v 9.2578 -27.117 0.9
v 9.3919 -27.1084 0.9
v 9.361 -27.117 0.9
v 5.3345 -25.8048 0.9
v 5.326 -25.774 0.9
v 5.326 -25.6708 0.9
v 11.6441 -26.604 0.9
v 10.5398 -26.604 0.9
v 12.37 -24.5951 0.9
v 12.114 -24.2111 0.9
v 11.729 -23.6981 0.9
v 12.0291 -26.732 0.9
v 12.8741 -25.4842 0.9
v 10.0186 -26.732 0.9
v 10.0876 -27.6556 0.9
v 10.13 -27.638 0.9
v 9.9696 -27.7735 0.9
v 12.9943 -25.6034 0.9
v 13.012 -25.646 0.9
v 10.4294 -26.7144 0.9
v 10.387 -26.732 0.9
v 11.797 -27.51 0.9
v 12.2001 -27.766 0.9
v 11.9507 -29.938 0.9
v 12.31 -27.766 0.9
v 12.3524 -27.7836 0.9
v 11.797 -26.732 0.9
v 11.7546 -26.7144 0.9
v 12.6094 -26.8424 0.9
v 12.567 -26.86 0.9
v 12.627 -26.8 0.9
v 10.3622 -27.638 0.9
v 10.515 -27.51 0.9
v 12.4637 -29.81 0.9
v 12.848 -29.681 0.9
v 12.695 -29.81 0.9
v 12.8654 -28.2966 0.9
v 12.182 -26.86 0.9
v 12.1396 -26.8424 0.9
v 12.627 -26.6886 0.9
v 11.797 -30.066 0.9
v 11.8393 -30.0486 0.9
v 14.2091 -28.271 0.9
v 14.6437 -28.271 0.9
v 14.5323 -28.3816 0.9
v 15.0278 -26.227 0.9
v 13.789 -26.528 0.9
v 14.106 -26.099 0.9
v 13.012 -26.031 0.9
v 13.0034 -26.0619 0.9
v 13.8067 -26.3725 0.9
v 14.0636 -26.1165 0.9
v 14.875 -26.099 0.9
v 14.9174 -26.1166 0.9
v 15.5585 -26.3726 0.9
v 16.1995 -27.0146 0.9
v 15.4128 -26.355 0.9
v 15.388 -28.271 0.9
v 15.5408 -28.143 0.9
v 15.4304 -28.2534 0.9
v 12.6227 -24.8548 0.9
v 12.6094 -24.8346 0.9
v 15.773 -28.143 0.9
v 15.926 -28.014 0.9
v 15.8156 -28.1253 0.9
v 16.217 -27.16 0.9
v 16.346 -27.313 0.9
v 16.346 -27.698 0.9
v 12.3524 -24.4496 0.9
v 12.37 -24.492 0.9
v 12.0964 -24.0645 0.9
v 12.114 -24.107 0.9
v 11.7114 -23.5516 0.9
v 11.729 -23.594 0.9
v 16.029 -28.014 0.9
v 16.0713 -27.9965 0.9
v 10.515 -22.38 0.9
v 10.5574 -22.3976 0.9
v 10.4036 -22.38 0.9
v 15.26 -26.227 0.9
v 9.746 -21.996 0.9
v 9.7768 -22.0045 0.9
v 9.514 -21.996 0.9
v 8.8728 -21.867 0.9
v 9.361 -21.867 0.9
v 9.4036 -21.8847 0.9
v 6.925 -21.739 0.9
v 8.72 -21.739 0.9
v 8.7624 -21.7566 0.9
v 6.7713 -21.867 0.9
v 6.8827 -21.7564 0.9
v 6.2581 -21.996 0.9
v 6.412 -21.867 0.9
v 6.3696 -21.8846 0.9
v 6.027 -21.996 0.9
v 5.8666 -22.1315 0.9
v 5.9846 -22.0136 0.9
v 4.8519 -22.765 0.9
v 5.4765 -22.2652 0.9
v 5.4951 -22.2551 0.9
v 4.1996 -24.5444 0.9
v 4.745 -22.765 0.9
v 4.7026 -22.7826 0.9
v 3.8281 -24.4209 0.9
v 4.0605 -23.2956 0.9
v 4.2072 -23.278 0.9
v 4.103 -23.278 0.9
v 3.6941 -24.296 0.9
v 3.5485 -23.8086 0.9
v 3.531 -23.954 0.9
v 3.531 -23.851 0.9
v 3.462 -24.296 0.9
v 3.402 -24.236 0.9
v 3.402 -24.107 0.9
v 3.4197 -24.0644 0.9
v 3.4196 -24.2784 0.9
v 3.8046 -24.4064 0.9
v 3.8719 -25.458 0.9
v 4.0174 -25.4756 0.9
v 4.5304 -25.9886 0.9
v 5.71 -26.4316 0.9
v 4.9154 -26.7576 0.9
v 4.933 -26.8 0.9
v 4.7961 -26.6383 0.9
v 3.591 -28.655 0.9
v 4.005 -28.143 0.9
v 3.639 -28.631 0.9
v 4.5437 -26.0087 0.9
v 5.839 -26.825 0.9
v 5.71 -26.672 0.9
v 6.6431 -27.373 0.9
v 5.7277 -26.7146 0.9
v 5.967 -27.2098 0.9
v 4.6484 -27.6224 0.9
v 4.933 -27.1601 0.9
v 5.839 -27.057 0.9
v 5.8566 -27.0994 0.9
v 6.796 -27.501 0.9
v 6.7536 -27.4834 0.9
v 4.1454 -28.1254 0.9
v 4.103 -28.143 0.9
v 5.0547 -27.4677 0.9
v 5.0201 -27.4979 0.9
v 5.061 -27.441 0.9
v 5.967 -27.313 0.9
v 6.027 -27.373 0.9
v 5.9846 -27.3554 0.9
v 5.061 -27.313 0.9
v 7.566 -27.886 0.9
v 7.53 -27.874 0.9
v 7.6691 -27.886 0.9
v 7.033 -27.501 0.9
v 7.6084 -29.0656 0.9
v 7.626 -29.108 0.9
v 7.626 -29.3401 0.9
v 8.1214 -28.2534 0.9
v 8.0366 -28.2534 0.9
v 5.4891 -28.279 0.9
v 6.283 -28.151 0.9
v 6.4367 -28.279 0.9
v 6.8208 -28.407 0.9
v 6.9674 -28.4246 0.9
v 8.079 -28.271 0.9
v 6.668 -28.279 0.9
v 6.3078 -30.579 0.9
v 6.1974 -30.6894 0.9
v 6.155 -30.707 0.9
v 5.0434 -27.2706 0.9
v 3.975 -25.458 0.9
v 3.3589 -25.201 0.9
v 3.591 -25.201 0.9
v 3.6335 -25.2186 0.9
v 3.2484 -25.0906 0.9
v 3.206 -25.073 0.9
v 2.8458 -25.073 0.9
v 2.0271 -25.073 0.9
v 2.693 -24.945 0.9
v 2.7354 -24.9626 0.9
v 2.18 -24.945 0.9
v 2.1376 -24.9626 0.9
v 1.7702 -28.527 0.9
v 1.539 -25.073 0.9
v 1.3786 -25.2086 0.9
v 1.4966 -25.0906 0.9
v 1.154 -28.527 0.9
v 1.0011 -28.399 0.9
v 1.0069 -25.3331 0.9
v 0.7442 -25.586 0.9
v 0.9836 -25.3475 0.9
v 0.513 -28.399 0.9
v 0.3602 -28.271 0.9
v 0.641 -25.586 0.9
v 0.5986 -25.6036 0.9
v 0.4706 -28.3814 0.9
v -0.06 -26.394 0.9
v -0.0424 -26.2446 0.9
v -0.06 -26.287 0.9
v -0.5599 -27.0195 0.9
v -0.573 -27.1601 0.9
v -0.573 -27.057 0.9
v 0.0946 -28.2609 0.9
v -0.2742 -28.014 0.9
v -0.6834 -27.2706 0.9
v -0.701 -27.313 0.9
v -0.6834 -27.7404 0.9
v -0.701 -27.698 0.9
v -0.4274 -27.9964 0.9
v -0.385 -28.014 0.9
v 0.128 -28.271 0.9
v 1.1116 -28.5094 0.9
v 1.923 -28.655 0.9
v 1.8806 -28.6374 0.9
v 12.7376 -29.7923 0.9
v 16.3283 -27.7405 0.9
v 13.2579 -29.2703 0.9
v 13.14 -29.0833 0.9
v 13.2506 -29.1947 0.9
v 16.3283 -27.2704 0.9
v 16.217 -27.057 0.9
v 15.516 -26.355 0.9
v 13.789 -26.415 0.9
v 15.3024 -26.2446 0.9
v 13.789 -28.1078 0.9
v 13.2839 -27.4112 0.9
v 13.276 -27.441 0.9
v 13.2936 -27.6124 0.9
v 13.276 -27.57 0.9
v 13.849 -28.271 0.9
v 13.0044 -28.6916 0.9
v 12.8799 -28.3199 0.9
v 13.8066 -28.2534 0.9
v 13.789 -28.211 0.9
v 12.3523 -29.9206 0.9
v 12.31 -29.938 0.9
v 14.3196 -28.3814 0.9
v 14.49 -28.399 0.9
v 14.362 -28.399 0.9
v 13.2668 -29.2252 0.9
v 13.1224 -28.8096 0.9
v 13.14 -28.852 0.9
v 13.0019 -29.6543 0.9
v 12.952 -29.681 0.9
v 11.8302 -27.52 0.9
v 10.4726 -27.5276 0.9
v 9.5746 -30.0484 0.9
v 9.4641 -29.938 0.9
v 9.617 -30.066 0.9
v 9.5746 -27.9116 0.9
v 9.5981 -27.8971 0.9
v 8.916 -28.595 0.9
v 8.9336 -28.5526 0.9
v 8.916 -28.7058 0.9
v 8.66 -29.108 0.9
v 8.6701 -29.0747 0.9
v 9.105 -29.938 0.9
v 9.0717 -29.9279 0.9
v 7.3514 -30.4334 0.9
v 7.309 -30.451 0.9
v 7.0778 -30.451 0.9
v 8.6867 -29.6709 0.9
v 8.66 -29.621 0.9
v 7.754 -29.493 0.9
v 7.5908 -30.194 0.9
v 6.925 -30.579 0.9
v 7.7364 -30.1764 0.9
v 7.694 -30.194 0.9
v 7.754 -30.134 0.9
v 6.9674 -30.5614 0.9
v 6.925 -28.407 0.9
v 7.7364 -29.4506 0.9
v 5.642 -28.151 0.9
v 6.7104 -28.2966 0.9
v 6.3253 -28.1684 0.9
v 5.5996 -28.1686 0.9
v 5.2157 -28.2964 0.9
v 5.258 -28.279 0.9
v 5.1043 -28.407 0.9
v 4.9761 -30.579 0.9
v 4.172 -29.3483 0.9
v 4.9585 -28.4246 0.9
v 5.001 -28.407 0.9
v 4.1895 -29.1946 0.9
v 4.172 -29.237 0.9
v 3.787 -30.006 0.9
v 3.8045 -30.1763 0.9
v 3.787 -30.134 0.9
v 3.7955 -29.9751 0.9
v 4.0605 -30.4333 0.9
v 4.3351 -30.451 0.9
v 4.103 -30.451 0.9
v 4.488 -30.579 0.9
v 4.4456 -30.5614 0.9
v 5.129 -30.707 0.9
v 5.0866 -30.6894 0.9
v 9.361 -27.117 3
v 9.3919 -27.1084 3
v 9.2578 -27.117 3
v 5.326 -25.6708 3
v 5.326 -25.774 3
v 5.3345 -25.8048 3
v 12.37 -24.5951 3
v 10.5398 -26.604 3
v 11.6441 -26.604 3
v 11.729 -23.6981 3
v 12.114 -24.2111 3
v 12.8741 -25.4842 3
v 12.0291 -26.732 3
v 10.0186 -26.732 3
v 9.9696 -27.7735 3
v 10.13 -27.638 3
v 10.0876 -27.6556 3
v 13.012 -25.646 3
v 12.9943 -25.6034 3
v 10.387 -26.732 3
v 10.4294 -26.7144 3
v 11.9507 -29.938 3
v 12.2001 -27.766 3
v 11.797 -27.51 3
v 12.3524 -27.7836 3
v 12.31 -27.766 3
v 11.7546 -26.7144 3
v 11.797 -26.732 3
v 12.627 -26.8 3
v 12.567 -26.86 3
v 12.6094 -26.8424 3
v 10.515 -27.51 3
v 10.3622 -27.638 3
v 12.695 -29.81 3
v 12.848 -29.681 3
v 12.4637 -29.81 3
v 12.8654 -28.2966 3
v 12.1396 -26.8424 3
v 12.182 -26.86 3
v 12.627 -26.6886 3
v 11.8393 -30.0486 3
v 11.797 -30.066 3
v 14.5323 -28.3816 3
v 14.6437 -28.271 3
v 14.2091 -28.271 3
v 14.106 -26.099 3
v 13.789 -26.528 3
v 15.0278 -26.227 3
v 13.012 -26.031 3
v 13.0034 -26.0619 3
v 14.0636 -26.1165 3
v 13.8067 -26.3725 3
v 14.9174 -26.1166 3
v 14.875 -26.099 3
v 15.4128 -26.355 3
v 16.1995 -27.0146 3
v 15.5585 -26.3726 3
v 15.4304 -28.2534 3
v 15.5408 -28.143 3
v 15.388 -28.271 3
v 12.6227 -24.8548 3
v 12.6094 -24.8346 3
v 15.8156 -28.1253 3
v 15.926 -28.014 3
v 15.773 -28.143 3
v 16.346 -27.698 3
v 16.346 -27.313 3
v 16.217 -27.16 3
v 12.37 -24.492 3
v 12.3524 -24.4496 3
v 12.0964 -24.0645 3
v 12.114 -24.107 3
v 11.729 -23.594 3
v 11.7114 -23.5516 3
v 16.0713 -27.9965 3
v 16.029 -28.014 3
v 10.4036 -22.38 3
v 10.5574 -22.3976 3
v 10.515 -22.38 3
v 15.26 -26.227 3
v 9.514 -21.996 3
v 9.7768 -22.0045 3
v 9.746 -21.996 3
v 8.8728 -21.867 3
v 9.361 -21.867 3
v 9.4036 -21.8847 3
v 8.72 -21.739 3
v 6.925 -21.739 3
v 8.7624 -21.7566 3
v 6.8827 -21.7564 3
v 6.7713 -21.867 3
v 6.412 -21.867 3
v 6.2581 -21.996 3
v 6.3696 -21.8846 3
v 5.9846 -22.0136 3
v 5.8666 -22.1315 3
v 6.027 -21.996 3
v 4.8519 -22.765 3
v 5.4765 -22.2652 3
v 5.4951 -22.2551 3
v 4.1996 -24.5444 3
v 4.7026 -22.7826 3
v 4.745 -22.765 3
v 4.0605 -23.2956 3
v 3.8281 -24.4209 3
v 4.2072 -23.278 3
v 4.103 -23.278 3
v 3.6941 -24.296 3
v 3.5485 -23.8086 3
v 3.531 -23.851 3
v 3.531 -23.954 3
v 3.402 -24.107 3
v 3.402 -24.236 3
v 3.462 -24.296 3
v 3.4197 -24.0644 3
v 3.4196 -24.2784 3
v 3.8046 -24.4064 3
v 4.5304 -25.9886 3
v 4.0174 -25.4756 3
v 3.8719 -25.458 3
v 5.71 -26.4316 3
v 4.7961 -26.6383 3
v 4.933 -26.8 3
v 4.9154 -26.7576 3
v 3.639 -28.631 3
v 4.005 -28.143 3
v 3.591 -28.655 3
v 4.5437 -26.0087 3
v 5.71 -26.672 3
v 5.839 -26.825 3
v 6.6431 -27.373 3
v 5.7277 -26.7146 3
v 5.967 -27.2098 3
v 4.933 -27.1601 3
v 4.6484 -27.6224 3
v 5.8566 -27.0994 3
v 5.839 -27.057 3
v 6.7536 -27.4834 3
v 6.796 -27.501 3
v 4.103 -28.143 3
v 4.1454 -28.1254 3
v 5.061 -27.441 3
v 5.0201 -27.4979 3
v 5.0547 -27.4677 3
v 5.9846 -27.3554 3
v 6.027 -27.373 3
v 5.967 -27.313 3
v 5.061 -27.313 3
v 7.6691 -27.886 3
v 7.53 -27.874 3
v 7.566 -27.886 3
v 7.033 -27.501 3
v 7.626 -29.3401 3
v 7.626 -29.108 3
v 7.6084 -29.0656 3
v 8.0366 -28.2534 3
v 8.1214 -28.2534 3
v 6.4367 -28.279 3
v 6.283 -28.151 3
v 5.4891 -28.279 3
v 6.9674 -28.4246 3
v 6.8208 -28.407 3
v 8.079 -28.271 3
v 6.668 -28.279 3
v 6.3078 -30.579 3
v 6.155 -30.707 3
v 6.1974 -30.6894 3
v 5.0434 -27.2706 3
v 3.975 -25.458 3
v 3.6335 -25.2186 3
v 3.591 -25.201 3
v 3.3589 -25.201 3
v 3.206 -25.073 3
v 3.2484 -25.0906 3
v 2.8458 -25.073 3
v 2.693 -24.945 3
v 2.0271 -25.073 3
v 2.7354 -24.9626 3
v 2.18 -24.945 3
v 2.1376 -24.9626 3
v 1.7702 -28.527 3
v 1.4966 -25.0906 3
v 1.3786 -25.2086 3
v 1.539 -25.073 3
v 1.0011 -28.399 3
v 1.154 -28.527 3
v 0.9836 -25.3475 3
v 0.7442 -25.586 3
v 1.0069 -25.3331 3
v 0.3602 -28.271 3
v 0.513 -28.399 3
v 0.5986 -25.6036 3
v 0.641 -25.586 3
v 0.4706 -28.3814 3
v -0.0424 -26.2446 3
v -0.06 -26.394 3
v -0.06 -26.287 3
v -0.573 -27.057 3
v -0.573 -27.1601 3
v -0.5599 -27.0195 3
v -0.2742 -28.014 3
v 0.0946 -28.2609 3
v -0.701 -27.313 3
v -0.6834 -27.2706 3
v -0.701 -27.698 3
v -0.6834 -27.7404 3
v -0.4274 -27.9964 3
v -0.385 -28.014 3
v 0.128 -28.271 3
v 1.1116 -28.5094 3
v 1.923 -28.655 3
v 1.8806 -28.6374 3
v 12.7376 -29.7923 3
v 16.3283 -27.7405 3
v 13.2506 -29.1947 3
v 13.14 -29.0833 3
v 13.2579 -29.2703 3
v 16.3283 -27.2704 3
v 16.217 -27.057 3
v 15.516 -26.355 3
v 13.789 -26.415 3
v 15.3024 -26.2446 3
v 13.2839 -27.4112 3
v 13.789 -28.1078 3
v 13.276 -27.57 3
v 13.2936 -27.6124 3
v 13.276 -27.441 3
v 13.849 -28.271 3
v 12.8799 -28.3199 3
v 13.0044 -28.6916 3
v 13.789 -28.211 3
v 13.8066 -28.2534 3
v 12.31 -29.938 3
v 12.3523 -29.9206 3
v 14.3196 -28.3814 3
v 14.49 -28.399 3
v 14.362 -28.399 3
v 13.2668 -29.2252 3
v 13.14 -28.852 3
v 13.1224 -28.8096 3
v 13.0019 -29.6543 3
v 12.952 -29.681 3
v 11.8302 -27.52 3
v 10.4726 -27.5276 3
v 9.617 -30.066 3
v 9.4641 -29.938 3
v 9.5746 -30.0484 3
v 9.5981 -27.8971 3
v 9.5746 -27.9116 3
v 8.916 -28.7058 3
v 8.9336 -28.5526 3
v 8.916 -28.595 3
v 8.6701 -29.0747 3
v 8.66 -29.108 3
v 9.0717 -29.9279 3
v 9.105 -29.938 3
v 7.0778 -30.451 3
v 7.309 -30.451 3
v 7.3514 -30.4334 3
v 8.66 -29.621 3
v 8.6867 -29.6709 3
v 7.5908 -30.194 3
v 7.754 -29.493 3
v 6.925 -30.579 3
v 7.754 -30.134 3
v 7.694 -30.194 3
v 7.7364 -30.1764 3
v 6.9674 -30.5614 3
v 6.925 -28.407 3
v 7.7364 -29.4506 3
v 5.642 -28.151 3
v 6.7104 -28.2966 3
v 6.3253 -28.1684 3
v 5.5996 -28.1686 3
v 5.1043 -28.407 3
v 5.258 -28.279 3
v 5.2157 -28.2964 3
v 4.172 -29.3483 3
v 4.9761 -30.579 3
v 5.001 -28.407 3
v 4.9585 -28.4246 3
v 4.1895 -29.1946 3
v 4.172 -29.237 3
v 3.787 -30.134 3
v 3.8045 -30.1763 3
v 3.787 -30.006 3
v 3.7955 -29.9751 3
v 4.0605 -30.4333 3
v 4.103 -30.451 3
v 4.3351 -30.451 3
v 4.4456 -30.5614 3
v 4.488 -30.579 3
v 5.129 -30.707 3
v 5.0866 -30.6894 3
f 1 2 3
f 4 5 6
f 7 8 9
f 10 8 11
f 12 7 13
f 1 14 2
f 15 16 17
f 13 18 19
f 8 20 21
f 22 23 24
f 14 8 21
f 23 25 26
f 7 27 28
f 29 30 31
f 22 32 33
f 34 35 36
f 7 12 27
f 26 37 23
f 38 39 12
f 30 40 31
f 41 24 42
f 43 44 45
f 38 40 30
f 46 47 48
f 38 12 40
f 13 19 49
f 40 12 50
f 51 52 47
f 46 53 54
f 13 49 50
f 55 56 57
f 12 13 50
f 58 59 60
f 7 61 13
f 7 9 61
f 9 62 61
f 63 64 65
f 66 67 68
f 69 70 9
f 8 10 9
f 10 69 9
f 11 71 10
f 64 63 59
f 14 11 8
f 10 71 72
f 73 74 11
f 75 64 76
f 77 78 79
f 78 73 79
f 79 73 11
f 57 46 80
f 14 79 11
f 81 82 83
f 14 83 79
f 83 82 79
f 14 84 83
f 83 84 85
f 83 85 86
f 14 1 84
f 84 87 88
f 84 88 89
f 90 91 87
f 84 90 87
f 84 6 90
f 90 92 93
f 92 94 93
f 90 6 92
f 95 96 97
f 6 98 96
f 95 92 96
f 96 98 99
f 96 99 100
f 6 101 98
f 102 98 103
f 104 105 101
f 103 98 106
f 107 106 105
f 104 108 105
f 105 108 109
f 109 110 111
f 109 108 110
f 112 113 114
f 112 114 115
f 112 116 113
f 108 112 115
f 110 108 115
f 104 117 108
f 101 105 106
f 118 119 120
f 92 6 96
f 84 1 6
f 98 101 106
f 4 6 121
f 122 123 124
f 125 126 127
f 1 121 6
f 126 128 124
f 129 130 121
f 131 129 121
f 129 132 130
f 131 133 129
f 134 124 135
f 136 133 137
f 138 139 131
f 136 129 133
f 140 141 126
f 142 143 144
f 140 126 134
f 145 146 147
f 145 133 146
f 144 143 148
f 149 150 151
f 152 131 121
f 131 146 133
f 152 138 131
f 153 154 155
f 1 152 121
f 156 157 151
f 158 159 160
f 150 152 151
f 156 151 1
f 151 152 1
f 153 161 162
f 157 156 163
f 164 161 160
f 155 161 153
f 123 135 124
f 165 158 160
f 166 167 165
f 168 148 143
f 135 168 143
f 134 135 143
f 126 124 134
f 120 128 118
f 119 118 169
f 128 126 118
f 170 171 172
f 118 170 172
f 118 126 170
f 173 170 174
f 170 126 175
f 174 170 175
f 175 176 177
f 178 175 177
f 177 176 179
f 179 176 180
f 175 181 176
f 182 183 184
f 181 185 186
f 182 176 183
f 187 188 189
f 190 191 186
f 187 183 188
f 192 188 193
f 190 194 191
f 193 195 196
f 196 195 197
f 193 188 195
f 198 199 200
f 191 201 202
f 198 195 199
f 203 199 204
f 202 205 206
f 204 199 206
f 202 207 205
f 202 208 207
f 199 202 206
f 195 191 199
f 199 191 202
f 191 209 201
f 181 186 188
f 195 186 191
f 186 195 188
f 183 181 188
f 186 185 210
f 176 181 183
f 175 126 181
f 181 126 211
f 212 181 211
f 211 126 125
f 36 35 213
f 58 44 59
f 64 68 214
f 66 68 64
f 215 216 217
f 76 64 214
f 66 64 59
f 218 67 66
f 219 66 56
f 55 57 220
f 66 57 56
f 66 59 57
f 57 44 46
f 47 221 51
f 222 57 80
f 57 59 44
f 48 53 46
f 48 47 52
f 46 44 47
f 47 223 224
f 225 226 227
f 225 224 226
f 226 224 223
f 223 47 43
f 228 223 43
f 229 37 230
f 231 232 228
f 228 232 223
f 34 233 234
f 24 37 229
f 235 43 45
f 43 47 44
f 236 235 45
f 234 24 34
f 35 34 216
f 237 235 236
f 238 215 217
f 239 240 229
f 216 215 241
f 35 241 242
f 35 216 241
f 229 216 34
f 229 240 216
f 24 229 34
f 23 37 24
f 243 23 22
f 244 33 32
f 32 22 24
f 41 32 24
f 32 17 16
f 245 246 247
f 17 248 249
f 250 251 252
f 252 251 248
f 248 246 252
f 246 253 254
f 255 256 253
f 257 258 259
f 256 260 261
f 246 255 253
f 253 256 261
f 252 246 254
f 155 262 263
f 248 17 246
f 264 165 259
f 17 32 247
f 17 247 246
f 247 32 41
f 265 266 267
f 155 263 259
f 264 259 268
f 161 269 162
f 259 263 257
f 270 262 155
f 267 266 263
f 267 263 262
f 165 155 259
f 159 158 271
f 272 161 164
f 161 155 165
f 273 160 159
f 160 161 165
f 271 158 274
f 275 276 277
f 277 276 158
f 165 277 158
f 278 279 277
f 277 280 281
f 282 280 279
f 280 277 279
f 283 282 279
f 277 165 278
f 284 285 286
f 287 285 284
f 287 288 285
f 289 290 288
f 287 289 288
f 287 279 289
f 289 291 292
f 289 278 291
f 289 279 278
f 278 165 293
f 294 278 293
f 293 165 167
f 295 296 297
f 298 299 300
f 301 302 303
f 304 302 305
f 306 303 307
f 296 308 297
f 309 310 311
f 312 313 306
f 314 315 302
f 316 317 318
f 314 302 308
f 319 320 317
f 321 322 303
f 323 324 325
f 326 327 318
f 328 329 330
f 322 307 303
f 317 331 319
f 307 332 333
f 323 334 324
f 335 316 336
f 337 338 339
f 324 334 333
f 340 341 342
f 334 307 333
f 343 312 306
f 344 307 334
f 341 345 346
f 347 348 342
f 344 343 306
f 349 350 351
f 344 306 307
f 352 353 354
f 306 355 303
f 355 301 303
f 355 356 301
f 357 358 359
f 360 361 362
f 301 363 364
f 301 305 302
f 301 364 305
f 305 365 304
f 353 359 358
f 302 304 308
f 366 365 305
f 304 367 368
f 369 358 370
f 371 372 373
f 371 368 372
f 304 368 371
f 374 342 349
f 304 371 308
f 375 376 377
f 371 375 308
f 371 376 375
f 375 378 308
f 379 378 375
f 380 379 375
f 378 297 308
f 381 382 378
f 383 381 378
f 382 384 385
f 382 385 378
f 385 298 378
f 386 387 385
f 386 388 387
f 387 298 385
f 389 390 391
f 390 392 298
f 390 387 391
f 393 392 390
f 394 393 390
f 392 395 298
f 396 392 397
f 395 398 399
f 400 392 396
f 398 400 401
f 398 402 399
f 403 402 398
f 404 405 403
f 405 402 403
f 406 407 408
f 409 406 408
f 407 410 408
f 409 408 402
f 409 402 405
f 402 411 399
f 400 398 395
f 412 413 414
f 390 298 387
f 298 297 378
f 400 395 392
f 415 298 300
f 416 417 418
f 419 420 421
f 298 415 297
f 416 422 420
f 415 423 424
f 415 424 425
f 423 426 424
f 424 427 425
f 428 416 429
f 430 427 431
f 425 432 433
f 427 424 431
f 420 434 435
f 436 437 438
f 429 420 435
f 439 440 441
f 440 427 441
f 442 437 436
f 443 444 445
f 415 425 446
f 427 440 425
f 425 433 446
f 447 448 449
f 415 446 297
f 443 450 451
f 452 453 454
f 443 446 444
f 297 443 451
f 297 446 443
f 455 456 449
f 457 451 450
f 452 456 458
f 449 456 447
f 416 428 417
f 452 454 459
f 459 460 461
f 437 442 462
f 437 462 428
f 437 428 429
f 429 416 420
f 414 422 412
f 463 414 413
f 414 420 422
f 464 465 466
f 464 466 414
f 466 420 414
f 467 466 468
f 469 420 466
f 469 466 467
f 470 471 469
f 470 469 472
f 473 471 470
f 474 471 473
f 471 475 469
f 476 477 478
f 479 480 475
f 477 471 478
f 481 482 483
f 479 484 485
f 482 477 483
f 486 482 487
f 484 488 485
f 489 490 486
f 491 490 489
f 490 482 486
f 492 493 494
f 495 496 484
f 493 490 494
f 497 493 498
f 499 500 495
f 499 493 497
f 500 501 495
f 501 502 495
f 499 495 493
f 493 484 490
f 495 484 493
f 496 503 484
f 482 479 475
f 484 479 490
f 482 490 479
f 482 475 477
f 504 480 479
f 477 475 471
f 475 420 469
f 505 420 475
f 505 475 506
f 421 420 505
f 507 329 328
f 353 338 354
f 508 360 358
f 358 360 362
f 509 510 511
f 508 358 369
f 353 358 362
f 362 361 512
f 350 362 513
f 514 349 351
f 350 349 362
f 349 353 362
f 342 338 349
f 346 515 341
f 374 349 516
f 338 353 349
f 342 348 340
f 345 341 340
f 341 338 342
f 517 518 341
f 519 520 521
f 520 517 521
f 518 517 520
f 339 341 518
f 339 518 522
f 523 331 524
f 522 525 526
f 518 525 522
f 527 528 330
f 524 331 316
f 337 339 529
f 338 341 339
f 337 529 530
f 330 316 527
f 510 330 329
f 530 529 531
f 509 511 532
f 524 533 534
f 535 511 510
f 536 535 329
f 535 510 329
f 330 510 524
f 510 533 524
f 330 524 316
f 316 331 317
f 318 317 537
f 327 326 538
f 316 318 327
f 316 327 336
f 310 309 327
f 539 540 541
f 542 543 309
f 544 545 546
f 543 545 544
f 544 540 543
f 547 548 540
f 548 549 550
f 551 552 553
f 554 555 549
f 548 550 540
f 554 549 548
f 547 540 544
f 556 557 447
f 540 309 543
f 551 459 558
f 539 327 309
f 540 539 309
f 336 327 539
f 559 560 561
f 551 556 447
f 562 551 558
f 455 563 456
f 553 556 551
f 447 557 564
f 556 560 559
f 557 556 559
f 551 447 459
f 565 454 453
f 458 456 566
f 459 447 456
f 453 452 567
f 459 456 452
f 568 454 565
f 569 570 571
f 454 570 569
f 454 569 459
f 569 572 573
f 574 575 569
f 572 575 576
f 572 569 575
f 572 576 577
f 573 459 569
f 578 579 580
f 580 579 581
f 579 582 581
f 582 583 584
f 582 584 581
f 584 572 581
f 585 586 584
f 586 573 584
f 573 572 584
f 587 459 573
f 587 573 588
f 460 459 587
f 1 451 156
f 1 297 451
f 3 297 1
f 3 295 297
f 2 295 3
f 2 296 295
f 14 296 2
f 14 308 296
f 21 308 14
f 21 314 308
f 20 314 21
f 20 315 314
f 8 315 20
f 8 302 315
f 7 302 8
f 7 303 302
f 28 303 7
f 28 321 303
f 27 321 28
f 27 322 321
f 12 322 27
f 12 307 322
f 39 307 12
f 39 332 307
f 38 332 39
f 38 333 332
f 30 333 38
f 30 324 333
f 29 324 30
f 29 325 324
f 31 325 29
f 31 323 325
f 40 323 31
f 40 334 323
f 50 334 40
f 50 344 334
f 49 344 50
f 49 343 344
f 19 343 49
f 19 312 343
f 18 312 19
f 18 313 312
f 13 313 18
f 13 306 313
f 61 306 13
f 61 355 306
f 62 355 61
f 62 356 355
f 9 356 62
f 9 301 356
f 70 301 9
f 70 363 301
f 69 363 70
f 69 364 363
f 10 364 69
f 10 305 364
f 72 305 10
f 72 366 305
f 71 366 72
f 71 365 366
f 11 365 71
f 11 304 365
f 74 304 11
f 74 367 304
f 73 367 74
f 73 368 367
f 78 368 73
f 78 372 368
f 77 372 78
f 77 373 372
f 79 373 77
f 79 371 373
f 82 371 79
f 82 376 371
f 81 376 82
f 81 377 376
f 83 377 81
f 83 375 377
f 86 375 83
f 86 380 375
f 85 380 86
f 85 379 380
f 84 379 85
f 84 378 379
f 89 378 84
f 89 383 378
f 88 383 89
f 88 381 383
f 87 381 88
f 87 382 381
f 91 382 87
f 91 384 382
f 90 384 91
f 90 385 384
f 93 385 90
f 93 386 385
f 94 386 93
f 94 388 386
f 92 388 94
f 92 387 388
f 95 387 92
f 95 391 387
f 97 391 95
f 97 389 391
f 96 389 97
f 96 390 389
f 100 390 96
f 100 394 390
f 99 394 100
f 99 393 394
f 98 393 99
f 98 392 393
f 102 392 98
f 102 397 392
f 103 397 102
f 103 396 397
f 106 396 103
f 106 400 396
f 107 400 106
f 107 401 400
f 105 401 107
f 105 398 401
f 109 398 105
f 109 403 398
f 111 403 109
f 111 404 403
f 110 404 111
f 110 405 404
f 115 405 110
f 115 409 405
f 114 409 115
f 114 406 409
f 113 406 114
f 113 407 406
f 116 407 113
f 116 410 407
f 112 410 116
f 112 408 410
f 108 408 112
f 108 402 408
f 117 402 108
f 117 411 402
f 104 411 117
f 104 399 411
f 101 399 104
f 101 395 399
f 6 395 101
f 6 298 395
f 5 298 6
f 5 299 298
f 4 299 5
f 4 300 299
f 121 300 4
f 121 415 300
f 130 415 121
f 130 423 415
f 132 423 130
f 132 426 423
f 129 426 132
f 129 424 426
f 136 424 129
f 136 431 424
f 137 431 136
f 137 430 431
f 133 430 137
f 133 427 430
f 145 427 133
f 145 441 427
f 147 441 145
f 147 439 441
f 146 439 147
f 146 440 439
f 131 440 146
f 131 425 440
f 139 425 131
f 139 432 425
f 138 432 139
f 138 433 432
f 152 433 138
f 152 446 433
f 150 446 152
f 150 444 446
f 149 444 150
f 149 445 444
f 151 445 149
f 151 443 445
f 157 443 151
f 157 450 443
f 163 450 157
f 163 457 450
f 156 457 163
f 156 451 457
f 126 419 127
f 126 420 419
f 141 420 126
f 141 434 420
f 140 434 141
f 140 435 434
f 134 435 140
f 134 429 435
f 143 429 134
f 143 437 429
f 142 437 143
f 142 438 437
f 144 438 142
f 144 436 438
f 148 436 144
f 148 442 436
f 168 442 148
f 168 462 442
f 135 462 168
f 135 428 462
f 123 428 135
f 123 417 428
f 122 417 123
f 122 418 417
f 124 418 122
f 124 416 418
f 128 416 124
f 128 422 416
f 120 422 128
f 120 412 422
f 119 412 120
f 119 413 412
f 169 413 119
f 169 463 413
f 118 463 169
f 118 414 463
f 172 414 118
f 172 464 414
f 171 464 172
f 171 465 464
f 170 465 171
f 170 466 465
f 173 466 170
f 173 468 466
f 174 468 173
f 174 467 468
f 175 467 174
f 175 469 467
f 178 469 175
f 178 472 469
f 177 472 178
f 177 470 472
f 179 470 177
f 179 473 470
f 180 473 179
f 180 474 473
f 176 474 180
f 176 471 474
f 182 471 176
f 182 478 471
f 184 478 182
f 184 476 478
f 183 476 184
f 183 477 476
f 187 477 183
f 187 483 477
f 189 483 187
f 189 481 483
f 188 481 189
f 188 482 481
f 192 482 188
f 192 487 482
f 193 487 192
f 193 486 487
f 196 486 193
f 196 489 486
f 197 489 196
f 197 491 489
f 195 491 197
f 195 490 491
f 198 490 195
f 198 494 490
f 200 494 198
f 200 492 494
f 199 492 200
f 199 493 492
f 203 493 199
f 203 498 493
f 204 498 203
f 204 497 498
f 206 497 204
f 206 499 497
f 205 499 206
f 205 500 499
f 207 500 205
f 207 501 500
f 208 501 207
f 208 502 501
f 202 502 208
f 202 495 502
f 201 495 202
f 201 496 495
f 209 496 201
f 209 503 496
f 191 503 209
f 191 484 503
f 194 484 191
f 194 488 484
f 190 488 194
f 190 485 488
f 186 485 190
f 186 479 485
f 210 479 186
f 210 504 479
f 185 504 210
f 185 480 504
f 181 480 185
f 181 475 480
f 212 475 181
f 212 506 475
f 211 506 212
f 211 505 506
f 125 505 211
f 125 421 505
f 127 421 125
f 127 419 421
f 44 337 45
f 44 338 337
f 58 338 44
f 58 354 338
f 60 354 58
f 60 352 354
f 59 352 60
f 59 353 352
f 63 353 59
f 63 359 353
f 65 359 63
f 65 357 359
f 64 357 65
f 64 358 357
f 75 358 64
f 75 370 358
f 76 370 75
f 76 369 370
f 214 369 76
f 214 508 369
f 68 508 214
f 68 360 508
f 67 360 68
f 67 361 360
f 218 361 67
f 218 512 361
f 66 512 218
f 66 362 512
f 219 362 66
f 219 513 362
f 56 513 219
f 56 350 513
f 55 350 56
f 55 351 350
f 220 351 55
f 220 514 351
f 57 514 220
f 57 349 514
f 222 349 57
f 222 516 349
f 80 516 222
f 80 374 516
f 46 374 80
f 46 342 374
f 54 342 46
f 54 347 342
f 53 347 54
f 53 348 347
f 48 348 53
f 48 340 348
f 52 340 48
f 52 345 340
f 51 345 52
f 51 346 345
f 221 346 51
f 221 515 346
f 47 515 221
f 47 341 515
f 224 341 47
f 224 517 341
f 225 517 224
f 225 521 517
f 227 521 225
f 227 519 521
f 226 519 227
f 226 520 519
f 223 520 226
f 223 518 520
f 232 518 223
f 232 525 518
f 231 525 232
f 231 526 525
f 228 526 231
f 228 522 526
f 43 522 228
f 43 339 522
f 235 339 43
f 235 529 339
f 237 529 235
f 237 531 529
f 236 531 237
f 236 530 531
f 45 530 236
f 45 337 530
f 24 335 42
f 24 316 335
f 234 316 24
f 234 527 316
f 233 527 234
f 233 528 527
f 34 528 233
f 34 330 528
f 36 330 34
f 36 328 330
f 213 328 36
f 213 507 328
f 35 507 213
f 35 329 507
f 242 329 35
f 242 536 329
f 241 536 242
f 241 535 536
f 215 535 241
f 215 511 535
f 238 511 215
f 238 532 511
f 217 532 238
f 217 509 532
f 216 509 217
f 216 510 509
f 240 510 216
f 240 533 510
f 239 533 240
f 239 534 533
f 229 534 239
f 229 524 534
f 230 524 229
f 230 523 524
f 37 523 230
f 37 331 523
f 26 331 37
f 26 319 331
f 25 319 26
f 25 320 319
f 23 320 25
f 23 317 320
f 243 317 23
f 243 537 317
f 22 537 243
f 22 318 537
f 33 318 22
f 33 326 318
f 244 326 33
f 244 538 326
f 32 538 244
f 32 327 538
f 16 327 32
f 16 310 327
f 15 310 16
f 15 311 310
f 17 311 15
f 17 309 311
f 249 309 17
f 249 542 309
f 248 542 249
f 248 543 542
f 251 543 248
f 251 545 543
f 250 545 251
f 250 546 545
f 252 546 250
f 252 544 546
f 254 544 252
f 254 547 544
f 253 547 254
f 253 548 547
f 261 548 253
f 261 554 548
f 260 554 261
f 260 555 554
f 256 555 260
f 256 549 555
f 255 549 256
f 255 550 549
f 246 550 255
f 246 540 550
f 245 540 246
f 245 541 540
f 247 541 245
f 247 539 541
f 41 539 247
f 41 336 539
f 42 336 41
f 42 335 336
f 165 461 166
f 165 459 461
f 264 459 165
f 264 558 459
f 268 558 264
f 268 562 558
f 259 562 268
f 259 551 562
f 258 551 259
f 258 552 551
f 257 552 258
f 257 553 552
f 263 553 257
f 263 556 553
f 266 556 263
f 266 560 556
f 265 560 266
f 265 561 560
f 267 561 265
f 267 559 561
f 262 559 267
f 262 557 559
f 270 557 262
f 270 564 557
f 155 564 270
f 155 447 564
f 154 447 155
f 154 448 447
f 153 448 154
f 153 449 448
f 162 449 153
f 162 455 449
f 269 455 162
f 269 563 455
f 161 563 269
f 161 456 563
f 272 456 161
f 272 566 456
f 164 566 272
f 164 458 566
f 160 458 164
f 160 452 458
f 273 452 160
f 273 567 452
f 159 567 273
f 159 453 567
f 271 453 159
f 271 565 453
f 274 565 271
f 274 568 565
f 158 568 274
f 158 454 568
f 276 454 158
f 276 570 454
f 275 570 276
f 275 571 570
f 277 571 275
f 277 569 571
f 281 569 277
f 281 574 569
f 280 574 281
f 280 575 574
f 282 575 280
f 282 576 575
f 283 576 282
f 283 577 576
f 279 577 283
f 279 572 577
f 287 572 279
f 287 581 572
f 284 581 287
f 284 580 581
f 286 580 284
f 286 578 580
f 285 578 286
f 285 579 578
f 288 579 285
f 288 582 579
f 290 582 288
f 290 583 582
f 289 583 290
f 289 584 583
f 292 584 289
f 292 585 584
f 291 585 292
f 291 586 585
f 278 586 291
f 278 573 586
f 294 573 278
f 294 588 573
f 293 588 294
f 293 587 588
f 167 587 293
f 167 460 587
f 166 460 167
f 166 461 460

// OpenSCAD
$fn = 24;
translate([0, -2.500, 0.900])
  linear_extrude(height=2.100) {
offset(r=0.06, $fn=8) {
    polygon(points=[[3.847,-27.506],[3.847,-27.634],[4.103,-27.891],[4.360,-27.891],[4.488,-28.019],[5.001,-28.019],[5.129,-28.147],[6.155,-28.147],[6.283,-28.019],[6.925,-28.019],[7.053,-27.891],[7.309,-27.891],[7.566,-27.634],[7.694,-27.634],[7.694,-26.993],[7.566,-26.865],[7.566,-26.608],[6.925,-25.967],[6.796,-25.967],[6.668,-25.839],[6.412,-25.839],[6.283,-25.711],[5.642,-25.711],[5.514,-25.839],[5.258,-25.839],[5.129,-25.967],[5.001,-25.967],[4.232,-26.737],[4.232,-26.865]], paths=[[0,1,2,3,4,5,6,7,8,9,10,11,12,13,14,15,16,17,18,19,20,21,22,23,24,25,26,27,28]]);
    polygon(points=[[8.720,-26.608],[8.720,-27.121],[9.105,-27.378],[9.489,-27.378],[9.617,-27.506],[11.797,-27.506],[11.926,-27.378],[12.310,-27.378],[12.439,-27.250],[12.695,-27.250],[12.823,-27.121],[12.952,-27.121],[13.208,-26.737],[13.080,-26.608],[13.080,-26.352],[12.952,-26.224],[12.823,-25.839],[12.310,-25.326],[12.182,-25.326],[11.797,-25.070],[10.515,-25.070],[10.387,-25.198],[10.130,-25.198],[10.002,-25.326],[9.617,-25.454],[8.976,-26.095],[8.976,-26.224]], paths=[[0,1,2,3,4,5,6,7,8,9,10,11,12,13,14,15,16,17,18,19,20,21,22,23,24,25,26]]);
    polygon(points=[[13.336,-24.941],[13.336,-25.070],[13.849,-25.583],[13.849,-25.711],[14.234,-25.711],[14.362,-25.839],[14.490,-25.839],[14.619,-25.711],[15.388,-25.711],[15.516,-25.583],[15.773,-25.583],[15.901,-25.454],[16.029,-25.454],[16.286,-25.198],[16.286,-24.813],[16.157,-24.685],[16.157,-24.557],[15.516,-23.915],[15.388,-23.915],[15.260,-23.787],[15.003,-23.787],[14.875,-23.659],[14.106,-23.659],[13.849,-23.915],[13.849,-24.044]], paths=[[0,1,2,3,4,5,6,7,8,9,10,11,12,13,14,15,16,17,18,19,20,21,22,23,24]]);
    polygon(points=[[5.001,-24.813],[4.873,-24.685],[4.873,-24.300],[4.745,-24.172],[4.488,-23.531],[3.975,-23.018],[3.847,-23.018],[3.591,-22.761],[3.334,-22.761],[3.206,-22.633],[2.821,-22.633],[2.693,-22.505],[2.180,-22.505],[2.052,-22.633],[1.539,-22.633],[1.411,-22.761],[1.026,-22.890],[0.769,-23.146],[0.641,-23.146],[0.000,-23.787],[0.000,-23.915],[-0.513,-24.557],[-0.513,-24.685],[-0.641,-24.813],[-0.641,-25.198],[-0.385,-25.454],[-0.256,-25.454],[0.128,-25.711],[0.385,-25.711],[0.513,-25.839],[1.026,-25.839],[1.154,-25.967],[1.795,-25.967],[1.923,-26.095],[3.591,-26.095],[3.975,-25.583],[4.103,-25.583],[4.616,-25.070],[5.001,-24.941]], paths=[[0,1,2,3,4,5,6,7,8,9,10,11,12,13,14,15,16,17,18,19,20,21,22,23,24,25,26,27,28,29,30,31,32,33,34,35,36,37,38]]);
    polygon(points=[[3.462,-21.607],[3.462,-21.736],[3.719,-21.736],[3.847,-21.864],[4.232,-21.992],[5.386,-23.146],[5.386,-23.274],[5.770,-23.915],[5.770,-24.172],[5.899,-24.300],[5.899,-24.557],[6.027,-24.685],[6.027,-24.813],[6.668,-24.813],[6.796,-24.941],[7.053,-24.941],[7.566,-25.326],[7.694,-25.326],[8.079,-25.711],[9.233,-24.557],[9.361,-24.557],[10.002,-24.172],[10.387,-24.172],[10.515,-24.044],[11.669,-24.044],[11.797,-24.172],[12.054,-24.172],[12.182,-24.300],[12.567,-24.300],[12.567,-24.172],[12.952,-23.531],[12.952,-23.146],[12.823,-23.018],[12.567,-22.377],[12.310,-22.120],[12.310,-21.992],[12.054,-21.736],[12.054,-21.607],[11.669,-21.223],[11.669,-21.094],[10.515,-19.940],[10.387,-19.940],[9.746,-19.556],[9.489,-19.556],[9.361,-19.427],[8.848,-19.427],[8.720,-19.299],[6.925,-19.299],[6.796,-19.427],[6.412,-19.427],[6.283,-19.556],[6.027,-19.556],[5.899,-19.684],[5.514,-19.812],[4.873,-20.325],[4.745,-20.325],[4.232,-20.838],[4.103,-20.838],[3.591,-21.351],[3.591,-21.479]], paths=[[0,1,2,3,4,5,6,7,8,9,10,11,12,13,14,15,16,17,18,19,20,21,22,23,24,25,26,27,28,29,30,31,32,33,34,35,36,37,38,39,40,41,42,43,44,45,46,47,48,49,50,51,52,53,54,55,56,57,58,59]]);
}
}
